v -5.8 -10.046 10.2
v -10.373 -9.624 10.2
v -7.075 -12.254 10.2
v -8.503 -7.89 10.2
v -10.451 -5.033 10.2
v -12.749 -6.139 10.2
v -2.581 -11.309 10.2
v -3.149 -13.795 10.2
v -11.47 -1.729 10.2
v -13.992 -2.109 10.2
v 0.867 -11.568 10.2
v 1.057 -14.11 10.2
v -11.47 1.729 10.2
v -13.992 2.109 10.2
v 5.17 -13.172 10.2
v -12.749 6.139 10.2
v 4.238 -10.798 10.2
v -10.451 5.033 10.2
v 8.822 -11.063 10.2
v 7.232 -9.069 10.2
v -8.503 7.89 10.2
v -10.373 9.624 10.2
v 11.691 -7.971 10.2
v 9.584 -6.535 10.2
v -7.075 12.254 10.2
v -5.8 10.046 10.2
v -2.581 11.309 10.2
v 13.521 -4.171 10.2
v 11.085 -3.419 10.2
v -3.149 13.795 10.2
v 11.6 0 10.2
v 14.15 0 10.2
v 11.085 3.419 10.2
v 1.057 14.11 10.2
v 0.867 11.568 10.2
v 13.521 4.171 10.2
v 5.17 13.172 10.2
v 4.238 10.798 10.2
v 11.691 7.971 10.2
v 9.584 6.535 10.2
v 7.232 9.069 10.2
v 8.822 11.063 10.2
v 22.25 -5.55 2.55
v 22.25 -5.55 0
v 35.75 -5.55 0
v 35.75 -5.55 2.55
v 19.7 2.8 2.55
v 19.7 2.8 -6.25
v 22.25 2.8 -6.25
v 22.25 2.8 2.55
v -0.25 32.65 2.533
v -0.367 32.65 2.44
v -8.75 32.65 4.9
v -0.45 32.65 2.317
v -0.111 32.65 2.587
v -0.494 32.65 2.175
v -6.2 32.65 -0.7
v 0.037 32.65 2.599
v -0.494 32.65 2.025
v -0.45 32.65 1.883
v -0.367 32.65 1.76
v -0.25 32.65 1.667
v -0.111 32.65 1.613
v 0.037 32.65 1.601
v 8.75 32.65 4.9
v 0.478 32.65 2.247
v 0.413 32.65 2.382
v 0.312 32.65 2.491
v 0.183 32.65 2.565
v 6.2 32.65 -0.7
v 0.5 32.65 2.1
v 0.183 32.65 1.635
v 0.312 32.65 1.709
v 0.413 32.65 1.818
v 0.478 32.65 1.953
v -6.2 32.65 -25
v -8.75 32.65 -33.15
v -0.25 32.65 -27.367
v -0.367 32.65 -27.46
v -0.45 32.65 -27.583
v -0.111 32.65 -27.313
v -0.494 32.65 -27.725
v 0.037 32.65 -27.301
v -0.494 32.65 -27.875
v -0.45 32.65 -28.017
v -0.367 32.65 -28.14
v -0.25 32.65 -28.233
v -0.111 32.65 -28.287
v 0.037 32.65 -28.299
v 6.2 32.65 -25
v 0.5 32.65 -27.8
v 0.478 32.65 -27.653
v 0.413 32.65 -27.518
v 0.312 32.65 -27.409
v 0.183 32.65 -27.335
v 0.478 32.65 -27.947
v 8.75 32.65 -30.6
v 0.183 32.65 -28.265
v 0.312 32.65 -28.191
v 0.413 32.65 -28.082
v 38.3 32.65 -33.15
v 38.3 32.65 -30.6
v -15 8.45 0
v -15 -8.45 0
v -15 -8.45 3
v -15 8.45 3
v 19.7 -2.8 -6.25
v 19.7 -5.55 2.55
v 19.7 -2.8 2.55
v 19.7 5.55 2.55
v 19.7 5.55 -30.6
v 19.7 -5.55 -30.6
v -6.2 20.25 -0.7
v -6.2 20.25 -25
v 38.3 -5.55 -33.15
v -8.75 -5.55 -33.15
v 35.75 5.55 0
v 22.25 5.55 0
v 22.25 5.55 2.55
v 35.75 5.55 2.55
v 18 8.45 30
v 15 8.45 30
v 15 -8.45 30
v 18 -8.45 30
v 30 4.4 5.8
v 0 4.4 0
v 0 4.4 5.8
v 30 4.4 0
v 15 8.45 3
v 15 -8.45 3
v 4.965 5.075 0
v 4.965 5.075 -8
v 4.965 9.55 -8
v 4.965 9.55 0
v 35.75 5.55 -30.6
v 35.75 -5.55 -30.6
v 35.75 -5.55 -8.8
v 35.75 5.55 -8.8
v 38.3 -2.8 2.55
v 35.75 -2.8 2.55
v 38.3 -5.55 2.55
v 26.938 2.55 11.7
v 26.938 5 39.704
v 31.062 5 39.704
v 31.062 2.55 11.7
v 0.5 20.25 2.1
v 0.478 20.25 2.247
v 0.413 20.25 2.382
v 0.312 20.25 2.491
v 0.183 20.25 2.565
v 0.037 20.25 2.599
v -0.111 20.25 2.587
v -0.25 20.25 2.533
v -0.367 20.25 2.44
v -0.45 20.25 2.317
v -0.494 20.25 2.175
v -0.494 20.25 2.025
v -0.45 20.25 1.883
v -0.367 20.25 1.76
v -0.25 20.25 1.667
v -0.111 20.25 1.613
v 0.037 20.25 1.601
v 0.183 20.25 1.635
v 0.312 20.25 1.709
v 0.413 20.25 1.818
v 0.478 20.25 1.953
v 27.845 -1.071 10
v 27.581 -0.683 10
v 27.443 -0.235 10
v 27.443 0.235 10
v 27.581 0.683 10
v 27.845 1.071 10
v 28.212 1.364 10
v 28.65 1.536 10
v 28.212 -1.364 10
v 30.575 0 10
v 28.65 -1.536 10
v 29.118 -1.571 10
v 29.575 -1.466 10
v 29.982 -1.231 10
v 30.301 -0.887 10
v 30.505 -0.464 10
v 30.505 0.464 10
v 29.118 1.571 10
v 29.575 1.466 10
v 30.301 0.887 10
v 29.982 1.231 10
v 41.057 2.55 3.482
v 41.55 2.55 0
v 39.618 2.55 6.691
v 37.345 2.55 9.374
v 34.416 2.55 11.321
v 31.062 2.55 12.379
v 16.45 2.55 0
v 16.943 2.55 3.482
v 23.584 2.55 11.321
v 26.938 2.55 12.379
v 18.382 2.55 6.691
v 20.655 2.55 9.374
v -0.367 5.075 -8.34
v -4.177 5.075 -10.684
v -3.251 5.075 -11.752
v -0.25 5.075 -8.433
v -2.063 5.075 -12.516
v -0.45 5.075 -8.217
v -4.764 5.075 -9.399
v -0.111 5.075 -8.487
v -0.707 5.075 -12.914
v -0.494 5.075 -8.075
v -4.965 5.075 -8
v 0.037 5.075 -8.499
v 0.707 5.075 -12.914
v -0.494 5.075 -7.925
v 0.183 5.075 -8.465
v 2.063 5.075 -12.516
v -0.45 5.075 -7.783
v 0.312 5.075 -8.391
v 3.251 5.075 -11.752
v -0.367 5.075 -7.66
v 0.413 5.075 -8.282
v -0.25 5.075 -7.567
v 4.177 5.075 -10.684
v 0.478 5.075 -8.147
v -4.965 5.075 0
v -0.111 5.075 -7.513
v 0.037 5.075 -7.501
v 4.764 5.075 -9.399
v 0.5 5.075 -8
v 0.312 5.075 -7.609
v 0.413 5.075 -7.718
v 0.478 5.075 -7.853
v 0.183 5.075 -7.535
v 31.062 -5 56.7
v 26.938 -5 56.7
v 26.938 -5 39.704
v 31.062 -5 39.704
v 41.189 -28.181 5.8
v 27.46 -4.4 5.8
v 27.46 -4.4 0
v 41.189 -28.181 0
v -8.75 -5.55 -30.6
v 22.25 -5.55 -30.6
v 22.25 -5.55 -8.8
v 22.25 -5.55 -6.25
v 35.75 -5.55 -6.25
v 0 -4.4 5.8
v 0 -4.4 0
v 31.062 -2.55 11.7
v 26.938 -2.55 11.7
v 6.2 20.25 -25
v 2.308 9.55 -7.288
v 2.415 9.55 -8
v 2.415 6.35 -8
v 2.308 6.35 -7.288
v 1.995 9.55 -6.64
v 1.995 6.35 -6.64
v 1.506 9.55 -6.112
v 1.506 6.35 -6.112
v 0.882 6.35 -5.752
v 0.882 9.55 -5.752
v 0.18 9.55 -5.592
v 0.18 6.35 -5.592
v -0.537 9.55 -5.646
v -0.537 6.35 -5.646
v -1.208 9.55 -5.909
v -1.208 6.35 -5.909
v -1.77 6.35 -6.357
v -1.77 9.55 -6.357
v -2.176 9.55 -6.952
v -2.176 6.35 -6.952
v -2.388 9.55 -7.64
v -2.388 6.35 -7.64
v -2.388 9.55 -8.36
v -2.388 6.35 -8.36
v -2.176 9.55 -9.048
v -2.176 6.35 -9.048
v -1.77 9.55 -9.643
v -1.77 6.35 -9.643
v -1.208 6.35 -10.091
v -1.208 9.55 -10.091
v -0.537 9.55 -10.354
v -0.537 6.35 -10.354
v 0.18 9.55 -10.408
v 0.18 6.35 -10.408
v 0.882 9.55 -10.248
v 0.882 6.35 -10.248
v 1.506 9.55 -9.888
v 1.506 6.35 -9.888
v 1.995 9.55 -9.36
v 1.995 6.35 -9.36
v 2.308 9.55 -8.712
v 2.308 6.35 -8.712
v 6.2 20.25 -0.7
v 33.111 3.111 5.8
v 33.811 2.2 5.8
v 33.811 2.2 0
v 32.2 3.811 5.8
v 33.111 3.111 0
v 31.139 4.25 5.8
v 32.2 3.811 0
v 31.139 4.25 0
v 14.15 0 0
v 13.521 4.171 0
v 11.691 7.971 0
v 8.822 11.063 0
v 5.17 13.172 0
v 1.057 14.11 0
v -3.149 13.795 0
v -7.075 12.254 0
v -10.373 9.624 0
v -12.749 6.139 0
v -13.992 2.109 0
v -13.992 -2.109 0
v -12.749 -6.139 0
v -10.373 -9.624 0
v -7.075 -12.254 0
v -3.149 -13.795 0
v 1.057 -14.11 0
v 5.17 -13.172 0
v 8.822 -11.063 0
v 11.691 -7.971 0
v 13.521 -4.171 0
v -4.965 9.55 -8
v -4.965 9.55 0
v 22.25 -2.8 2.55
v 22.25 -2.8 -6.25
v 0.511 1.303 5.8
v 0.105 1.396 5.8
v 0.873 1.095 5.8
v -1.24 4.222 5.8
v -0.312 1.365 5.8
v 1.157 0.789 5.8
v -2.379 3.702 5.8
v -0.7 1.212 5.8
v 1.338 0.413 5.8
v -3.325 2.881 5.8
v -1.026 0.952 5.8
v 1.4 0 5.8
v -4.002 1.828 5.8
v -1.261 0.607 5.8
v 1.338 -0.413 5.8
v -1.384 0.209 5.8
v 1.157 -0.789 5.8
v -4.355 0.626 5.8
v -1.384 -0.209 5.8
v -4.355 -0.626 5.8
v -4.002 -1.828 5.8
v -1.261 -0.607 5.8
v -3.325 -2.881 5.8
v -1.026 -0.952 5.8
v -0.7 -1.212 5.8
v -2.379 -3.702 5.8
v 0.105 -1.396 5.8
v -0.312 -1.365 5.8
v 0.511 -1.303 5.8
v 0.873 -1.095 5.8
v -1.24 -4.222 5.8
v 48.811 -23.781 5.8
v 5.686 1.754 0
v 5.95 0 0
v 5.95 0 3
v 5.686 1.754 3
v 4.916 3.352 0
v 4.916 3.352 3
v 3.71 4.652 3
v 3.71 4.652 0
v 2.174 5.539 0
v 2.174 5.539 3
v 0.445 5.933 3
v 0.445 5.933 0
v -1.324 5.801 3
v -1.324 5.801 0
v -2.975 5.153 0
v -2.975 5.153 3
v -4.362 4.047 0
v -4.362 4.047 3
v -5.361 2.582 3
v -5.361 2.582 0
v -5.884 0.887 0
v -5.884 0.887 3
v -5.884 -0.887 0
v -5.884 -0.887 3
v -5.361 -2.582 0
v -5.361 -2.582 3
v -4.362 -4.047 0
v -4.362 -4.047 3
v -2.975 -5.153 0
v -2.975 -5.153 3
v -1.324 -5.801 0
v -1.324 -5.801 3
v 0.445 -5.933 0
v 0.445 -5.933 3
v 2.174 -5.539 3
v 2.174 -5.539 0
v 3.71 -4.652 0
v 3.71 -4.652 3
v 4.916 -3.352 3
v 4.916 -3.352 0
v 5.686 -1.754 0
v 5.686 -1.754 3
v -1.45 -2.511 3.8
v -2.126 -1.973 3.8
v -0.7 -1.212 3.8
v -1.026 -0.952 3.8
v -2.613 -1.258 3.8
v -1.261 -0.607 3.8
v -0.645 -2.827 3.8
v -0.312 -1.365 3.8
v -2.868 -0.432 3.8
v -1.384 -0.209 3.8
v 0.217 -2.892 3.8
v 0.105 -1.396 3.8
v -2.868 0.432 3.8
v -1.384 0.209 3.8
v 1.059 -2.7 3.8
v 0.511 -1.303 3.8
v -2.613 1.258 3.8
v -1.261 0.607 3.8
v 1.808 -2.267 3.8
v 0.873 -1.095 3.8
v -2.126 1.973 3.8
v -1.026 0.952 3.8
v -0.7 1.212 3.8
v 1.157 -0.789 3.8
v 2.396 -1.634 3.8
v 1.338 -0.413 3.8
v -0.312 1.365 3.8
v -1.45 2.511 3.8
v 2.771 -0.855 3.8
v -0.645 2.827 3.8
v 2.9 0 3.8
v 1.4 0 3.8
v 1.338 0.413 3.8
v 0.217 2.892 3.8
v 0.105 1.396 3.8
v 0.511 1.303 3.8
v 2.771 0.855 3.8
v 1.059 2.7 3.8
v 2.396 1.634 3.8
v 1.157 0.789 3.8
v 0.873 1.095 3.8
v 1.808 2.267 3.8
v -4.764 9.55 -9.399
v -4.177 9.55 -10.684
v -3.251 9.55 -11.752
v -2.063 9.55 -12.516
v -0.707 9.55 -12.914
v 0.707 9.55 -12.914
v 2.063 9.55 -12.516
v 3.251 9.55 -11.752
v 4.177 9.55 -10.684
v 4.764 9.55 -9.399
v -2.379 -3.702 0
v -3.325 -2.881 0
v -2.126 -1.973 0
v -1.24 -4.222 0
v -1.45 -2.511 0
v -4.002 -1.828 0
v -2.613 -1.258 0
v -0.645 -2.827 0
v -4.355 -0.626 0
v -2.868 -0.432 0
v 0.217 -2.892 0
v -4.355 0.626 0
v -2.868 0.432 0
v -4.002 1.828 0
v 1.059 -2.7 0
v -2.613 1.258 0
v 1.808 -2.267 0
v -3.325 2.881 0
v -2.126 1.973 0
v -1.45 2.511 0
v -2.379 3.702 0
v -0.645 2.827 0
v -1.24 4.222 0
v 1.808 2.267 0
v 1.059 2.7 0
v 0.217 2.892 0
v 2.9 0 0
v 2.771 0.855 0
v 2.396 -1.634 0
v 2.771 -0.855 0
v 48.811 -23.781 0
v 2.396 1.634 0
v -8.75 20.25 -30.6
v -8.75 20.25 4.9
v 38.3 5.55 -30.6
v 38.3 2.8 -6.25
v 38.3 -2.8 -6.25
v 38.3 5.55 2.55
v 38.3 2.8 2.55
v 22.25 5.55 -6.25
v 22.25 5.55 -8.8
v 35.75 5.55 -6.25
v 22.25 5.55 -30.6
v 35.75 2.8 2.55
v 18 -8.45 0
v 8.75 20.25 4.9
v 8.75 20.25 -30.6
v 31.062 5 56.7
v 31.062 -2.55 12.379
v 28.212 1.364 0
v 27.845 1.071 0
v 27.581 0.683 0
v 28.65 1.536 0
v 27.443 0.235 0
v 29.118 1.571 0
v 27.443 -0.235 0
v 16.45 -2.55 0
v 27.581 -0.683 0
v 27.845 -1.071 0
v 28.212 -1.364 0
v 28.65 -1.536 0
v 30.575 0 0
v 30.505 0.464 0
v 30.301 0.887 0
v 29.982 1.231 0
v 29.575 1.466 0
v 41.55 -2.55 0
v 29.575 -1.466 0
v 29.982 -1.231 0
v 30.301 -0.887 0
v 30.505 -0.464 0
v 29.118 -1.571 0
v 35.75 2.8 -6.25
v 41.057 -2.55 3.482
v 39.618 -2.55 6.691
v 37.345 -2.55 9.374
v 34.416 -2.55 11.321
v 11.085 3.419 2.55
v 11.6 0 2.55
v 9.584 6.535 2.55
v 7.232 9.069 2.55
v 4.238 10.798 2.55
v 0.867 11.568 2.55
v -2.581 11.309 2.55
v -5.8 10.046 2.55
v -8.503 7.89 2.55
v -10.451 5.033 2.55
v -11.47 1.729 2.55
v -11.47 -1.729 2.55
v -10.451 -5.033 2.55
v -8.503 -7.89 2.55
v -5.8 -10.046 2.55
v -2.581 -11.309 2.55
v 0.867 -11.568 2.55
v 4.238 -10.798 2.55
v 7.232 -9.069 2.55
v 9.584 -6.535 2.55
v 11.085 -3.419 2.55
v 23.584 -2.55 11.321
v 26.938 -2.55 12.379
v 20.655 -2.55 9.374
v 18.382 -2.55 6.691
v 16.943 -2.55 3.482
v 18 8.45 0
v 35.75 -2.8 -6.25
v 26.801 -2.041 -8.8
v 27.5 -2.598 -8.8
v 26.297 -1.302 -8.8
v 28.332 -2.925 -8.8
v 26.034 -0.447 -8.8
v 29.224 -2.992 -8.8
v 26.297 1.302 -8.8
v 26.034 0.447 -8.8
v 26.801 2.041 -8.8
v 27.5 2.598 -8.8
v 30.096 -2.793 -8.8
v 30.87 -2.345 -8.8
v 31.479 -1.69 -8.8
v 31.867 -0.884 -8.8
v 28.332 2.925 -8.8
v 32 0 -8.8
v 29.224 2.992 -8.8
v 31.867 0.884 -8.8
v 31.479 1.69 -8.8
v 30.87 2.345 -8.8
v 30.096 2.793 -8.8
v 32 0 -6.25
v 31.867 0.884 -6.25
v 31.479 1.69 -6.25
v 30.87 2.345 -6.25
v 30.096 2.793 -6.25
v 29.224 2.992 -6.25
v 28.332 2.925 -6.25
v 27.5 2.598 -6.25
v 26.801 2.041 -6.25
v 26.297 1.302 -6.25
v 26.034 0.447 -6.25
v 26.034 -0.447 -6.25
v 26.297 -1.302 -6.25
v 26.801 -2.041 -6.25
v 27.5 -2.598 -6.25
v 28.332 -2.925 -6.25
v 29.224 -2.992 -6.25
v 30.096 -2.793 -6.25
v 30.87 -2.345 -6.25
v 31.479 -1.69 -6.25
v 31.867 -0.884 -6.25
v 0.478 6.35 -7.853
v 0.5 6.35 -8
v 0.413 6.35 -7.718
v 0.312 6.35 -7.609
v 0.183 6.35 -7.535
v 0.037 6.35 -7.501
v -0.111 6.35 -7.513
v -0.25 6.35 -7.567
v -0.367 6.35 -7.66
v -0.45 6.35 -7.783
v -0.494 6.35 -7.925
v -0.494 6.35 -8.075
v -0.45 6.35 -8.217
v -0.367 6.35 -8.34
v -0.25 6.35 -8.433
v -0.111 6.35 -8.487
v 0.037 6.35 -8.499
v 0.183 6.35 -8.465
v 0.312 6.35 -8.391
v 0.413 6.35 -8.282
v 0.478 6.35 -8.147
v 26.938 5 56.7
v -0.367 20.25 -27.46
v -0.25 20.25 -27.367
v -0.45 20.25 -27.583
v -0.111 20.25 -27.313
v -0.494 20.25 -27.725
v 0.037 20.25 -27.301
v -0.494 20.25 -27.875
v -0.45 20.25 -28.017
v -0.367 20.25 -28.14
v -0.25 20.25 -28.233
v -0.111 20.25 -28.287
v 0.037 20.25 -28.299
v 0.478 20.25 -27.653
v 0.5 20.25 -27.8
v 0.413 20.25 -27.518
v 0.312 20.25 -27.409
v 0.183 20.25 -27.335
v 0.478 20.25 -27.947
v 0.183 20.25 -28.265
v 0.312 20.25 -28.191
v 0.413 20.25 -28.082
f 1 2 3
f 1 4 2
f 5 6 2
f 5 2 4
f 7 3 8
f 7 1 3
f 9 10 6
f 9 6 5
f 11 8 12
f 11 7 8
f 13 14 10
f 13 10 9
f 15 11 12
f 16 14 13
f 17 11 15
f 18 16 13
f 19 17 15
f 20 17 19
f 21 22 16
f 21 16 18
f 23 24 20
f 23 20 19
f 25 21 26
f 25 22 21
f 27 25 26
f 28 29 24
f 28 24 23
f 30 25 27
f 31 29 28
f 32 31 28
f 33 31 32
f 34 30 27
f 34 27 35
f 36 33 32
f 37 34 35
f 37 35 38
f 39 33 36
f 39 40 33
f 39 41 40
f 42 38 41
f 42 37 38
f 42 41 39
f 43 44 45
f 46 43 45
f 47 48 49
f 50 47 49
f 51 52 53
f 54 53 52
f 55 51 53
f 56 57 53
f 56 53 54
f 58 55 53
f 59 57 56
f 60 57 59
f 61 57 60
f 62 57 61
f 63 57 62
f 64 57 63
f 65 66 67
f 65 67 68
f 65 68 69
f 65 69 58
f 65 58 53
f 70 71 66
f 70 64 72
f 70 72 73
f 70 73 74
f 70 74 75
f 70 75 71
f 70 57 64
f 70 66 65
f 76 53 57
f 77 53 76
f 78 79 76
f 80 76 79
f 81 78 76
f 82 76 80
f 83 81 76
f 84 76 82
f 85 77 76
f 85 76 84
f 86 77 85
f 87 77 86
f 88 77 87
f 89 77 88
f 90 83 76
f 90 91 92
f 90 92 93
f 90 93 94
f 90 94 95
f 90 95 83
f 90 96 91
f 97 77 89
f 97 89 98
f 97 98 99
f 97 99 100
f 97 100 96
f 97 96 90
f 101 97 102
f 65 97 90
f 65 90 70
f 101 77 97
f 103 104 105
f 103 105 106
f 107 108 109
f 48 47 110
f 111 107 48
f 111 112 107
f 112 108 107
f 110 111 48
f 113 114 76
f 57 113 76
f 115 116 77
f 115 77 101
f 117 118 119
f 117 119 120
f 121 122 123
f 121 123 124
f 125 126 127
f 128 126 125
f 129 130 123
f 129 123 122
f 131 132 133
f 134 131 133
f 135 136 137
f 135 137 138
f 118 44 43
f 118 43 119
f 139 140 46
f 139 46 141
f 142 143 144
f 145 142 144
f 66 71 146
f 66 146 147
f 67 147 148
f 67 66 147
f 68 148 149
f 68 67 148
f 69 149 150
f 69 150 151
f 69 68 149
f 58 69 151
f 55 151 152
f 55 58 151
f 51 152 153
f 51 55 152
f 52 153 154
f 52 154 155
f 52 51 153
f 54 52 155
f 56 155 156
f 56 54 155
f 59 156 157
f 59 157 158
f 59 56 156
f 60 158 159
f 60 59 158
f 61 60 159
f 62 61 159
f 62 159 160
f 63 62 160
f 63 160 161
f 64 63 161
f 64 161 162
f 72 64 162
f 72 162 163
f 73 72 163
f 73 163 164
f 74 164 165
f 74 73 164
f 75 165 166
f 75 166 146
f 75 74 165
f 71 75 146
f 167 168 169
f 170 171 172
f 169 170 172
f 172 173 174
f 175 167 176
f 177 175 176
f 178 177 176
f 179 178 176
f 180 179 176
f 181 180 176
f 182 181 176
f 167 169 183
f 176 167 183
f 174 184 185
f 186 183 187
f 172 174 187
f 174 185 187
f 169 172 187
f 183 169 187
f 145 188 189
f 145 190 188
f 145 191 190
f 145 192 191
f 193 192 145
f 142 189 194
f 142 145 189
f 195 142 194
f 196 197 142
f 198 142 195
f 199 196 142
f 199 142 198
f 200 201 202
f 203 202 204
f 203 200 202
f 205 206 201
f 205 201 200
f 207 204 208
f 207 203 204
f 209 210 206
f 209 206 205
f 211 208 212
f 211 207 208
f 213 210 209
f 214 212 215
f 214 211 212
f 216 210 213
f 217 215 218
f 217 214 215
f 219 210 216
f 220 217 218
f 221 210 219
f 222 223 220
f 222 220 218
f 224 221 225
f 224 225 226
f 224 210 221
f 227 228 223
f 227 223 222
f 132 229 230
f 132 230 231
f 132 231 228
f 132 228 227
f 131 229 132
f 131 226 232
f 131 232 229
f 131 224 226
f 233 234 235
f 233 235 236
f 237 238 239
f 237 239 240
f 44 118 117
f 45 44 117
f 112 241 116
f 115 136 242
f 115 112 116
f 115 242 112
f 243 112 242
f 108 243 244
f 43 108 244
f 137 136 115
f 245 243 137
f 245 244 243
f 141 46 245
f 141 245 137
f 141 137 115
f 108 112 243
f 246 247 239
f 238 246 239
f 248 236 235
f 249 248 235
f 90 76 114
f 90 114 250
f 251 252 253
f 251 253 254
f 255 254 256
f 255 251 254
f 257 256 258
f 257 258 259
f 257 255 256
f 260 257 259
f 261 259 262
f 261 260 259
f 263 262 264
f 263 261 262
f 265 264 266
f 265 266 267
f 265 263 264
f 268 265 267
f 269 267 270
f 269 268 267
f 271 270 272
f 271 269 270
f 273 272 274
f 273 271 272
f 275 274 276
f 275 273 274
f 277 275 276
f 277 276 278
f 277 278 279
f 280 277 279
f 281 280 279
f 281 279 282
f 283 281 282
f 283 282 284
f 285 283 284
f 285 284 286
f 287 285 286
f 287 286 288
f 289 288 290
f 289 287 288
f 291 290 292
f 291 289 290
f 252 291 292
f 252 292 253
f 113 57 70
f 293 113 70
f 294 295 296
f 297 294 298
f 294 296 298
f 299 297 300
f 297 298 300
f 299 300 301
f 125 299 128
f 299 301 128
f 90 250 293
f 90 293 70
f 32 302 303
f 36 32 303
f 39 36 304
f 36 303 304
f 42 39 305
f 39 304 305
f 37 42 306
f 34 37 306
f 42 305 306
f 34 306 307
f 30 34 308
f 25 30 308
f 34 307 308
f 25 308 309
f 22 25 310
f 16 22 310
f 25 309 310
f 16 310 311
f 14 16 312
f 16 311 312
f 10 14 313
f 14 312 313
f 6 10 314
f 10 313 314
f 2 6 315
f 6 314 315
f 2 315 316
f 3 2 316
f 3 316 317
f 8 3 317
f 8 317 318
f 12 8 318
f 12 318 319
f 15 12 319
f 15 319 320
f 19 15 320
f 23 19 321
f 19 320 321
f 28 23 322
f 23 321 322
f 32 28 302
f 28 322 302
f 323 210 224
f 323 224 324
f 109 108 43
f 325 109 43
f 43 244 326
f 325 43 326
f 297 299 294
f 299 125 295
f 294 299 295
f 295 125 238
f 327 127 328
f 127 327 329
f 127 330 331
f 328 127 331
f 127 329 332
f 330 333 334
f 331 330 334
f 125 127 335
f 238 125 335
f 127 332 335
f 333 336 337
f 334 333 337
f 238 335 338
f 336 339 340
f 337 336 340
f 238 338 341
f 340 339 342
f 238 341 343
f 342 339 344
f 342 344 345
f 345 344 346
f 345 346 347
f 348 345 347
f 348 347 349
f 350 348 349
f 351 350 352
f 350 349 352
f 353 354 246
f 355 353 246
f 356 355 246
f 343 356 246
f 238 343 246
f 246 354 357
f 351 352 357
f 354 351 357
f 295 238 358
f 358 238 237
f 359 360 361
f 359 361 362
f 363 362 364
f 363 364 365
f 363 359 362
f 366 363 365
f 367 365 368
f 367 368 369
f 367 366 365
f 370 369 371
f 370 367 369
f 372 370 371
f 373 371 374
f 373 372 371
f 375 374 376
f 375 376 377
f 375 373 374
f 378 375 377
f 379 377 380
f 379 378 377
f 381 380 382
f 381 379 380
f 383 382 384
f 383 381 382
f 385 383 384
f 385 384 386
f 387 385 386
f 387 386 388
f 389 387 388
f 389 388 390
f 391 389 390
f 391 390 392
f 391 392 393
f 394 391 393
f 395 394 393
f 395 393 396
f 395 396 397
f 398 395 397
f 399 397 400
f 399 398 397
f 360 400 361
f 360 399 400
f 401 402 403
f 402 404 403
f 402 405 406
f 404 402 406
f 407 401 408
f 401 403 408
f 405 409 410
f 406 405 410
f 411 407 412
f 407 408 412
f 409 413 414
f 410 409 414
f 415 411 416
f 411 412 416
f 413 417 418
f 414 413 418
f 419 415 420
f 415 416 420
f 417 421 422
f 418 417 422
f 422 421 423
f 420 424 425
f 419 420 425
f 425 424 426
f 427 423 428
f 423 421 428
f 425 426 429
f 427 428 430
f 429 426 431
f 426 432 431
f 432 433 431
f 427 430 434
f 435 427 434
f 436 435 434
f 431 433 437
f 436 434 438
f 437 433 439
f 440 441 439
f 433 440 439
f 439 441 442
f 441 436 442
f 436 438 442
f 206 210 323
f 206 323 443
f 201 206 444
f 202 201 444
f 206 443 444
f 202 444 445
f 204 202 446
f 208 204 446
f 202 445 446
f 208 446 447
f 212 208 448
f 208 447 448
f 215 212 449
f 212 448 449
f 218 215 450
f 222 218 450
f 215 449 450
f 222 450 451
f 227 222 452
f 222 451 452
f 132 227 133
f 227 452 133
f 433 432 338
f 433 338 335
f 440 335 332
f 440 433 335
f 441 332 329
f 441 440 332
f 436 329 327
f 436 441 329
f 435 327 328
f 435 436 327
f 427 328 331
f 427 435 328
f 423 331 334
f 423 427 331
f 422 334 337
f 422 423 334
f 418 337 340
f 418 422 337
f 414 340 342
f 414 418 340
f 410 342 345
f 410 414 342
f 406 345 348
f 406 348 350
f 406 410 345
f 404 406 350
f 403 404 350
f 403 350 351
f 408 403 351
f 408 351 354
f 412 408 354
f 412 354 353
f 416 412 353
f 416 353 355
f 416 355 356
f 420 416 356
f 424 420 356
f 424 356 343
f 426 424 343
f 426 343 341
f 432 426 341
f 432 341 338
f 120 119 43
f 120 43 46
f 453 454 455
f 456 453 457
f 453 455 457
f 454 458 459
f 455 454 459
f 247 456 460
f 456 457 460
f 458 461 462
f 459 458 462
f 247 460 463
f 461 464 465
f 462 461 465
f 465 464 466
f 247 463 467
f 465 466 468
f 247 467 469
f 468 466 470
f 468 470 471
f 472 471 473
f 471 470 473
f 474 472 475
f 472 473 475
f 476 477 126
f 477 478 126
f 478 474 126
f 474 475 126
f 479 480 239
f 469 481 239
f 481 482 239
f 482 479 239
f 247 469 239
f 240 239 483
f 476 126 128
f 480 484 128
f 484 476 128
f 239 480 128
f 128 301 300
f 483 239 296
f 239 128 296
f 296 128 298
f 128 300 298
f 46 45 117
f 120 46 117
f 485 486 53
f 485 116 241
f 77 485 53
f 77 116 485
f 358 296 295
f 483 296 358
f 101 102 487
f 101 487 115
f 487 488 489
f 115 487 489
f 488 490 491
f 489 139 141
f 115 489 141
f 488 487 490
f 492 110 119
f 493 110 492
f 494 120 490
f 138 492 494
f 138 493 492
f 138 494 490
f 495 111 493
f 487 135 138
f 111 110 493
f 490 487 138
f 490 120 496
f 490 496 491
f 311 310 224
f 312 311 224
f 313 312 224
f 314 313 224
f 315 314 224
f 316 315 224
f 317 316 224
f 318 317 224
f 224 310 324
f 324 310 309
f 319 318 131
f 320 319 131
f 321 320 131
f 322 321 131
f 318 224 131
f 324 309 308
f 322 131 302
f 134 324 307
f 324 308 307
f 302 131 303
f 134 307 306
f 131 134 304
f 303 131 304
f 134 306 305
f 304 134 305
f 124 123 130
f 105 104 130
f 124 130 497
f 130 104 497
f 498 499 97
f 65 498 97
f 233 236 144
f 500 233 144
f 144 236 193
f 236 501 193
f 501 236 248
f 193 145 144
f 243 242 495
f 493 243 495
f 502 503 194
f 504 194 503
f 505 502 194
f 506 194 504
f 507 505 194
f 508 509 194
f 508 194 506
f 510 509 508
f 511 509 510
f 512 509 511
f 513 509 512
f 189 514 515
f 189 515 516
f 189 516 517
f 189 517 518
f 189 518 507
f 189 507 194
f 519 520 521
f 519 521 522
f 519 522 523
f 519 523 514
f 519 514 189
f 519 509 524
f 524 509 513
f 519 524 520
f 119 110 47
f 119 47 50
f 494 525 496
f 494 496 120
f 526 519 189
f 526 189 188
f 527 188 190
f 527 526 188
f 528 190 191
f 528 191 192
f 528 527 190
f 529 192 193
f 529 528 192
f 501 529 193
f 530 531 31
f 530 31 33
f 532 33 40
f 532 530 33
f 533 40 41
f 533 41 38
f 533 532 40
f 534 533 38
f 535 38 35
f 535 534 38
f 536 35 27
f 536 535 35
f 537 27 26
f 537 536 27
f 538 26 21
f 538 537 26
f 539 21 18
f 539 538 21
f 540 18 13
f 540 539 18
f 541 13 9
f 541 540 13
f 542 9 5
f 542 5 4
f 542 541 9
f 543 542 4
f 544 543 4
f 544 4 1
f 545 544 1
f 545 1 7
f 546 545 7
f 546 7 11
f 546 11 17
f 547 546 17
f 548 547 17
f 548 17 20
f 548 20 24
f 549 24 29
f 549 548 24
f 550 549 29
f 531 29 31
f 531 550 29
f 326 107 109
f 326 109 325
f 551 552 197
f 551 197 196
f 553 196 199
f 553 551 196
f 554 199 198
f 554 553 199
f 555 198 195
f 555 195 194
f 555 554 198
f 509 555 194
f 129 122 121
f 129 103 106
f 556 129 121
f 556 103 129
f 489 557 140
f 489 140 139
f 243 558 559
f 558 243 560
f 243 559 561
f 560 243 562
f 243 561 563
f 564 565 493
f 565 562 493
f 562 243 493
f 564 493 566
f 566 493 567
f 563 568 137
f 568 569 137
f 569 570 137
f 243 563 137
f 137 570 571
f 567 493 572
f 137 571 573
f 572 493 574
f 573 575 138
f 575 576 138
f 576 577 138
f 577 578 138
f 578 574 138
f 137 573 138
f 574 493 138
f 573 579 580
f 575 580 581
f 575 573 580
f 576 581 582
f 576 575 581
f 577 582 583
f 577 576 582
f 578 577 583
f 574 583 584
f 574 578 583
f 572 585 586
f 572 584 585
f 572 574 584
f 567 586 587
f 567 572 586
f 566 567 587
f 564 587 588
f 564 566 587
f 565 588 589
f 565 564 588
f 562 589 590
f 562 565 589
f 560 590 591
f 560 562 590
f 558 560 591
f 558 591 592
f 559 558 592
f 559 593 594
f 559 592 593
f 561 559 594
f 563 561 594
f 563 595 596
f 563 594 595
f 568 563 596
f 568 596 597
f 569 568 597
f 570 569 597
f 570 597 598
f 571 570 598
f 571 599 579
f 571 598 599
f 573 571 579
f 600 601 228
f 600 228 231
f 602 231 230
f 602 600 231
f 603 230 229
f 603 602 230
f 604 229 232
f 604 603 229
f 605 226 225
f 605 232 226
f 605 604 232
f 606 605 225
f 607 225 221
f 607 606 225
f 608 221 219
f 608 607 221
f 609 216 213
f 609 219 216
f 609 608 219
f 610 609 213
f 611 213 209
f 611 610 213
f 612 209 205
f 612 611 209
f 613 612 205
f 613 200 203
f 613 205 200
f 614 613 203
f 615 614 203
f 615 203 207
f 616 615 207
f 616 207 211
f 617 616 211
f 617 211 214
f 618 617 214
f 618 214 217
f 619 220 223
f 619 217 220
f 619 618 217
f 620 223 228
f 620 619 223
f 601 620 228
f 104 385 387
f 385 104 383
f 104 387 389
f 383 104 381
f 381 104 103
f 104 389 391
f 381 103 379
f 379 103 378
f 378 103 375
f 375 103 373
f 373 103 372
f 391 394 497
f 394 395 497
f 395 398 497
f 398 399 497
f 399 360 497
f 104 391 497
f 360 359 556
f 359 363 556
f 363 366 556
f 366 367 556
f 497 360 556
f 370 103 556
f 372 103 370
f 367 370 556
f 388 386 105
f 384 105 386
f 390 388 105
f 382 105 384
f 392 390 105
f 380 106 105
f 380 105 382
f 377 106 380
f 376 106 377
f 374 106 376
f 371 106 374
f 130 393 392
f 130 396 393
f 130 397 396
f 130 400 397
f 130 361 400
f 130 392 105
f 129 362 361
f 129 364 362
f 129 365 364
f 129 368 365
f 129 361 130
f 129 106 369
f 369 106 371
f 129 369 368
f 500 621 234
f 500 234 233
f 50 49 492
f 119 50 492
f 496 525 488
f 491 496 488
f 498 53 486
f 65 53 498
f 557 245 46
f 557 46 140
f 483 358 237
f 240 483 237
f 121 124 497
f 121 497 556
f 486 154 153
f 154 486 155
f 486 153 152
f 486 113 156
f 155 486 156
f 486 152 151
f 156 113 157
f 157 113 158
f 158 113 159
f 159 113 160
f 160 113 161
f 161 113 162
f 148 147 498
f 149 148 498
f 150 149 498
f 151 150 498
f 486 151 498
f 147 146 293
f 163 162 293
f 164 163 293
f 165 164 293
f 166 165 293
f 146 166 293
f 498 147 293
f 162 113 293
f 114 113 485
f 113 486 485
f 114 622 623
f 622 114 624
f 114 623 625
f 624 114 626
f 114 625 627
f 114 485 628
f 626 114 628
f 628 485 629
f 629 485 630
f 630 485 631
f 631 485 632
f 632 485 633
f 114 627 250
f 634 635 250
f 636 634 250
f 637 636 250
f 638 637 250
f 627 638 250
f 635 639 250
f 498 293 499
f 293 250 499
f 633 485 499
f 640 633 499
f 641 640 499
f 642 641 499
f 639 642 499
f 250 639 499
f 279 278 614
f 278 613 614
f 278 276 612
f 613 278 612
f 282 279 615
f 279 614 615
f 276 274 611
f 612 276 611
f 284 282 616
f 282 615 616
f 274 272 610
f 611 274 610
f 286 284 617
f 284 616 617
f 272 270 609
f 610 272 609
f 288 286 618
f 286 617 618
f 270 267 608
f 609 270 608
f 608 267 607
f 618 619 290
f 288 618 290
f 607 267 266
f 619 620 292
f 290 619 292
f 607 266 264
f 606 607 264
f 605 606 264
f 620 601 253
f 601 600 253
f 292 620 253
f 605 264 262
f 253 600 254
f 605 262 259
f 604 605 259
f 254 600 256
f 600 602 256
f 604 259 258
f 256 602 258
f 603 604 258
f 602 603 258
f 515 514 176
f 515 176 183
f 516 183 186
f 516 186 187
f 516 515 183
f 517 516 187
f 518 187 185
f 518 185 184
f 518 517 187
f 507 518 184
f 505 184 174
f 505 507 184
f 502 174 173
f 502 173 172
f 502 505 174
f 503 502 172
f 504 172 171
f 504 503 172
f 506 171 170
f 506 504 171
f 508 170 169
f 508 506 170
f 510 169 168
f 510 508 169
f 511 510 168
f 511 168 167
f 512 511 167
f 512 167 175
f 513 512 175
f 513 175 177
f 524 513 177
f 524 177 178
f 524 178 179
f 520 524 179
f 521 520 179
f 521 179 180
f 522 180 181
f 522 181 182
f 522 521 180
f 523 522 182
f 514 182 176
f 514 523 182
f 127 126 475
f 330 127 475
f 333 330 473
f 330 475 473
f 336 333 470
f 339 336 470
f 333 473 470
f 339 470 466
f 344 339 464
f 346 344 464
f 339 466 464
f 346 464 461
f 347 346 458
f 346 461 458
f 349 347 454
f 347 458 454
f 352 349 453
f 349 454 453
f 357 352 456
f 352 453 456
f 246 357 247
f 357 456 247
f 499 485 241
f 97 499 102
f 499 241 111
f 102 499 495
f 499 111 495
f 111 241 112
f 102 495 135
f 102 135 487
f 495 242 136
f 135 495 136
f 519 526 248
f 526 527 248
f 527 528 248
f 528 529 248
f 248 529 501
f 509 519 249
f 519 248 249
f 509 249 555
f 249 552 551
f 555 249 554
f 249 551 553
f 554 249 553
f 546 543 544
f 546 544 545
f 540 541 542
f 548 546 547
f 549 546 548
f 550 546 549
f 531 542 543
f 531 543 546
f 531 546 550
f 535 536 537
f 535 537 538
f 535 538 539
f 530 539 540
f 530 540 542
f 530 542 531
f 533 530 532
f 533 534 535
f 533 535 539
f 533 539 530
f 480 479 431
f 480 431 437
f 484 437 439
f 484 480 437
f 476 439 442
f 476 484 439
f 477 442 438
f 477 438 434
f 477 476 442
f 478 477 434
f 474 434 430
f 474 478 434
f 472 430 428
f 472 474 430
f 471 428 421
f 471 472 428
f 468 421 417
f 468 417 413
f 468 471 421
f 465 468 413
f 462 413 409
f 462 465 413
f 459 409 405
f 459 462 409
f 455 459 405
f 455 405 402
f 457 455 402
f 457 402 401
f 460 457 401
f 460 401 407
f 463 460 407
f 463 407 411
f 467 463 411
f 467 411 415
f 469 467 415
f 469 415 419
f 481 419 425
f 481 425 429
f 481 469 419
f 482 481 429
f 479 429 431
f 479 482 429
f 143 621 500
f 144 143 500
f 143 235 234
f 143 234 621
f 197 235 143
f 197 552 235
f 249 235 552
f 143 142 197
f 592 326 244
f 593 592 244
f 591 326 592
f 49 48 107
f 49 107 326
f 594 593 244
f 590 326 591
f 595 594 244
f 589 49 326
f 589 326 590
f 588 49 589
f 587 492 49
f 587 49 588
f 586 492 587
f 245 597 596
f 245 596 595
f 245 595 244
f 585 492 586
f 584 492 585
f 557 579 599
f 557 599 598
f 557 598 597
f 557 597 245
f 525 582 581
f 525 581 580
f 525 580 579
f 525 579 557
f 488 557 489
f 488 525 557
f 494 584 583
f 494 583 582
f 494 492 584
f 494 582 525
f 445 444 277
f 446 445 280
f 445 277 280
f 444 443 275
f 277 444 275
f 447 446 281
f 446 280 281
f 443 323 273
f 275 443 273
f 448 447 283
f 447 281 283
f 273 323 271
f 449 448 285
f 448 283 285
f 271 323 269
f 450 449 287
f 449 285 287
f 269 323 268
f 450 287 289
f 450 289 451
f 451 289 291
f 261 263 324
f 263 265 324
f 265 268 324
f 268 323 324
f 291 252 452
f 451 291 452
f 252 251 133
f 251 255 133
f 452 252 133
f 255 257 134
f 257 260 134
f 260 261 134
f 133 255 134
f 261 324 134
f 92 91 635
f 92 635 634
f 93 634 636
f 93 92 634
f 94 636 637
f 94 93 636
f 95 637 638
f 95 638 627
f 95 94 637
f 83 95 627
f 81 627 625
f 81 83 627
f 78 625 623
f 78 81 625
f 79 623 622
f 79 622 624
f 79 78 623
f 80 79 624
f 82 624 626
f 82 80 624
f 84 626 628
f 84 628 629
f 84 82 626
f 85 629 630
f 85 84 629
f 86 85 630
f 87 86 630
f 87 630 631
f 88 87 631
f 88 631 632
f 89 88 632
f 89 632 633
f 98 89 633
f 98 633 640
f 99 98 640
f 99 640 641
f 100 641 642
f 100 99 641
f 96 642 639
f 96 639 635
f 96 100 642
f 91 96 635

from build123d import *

# Parameters (mm, degrees)
CYLINDER_R                = 1.575
CYLINDER_DEPTH            = 10
CYLINDER001_W             = 12.55
CYLINDER001_H             = 5.1
CYLINDER001_ANGLE         = 180
BOX002_W                  = 4.125
BOX002_H                  = 10
BOX002_DEPTH              = 45
BOX002_ROLL_ANGLE         = -5.000003
BOX002_PLACEMENT_ANGLE    = 180
BOX001_W                  = 4.125
BOX001_H                  = 10
BOX001_DEPTH              = 45
BOX001_PLACEMENT_ANGLE    = 5
BOX_W                     = 4.125
BOX_H                     = 10
BOX_DEPTH                 = 45
CYLINDER006_R             = 0.5
CYLINDER006_DEPTH         = 8.95
CYLINDER004_R             = 2.415
CYLINDER004_DEPTH         = 3.2
CYLINDER002_R             = 11.6
CYLINDER002_DEPTH         = 7.65
BOX003_W                  = 9.93
BOX003_H                  = 4.475
BOX003_DEPTH              = 8
CYLINDER005_R             = 4.965
CYLINDER005_DEPTH         = 4.475
CYLINDER003_R             = 14.15
CYLINDER003_DEPTH         = 10.2
BOX012_W                  = 13.5
BOX012_H                  = 11.1
BOX012_DEPTH              = 2.55
CYLINDER007_R             = 0.5
CYLINDER007_DEPTH         = 12.4
CYLINDER008_R             = 0.5
CYLINDER008_DEPTH         = 12.4
CYLINDER009_R             = 3
CYLINDER009_DEPTH         = 7.65
BOX013_W                  = 18.6
BOX013_H                  = 5.6
BOX013_DEPTH              = 11.35
BOX010_W                  = 2.55
BOX010_H                  = 11.1
BOX010_DEPTH              = 33.15
BOX008_W                  = 13.5
BOX008_H                  = 11.1
BOX008_DEPTH              = 2.55
BOX009_W                  = 47.05
BOX009_H                  = 38.2
BOX009_DEPTH              = 2.55
BOX007_W                  = 12.4
BOX007_H                  = 12.4
BOX007_DEPTH              = 5.6
BOX006_W                  = 2.55
BOX006_H                  = 12.4
BOX006_DEPTH              = 35.5
BOX005_W                  = 2.55
BOX005_H                  = 12.4
BOX005_DEPTH              = 35.5
BOX004_W                  = 12.4
BOX004_H                  = 12.4
BOX004_DEPTH              = 5.6
BOX011_W                  = 2.55
BOX011_H                  = 11.1
BOX011_DEPTH              = 33.15
CYLINDER013_R             = 5.95
CYLINDER013_DEPTH         = 3
BOX016_W                  = 3
BOX016_H                  = 16.9
BOX016_DEPTH              = 30
BOX015_W                  = 30
BOX015_H                  = 16.9
BOX015_DEPTH              = 3
CYLINDER014_R             = 4.4
CYLINDER014_DEPTH         = 5.8
BOX018_W                  = 30
BOX018_H                  = 4.4
BOX018_DEPTH              = 5.8
BOX017_W                  = 30
BOX017_H                  = 4.4
BOX017_DEPTH              = 5.8
FUSION005_PLACEMENT_ANGLE = 300
CYLINDER010_R             = 2.9
CYLINDER010_DEPTH         = 3.8
CYLINDER012_R             = 1.4
CYLINDER012_DEPTH         = 5.8
CYLINDER011_R             = 4.4
CYLINDER011_DEPTH         = 5.8
BOX014_W                  = 30
BOX014_H                  = 8.8
BOX014_DEPTH              = 5.8


with BuildPart() as palancahueco:
    # Cylinder → Cylinder (new body)
    with BuildSketch(Plane.XY):
        Circle(CYLINDER_R)
    extrude(amount=CYLINDER_DEPTH)


with BuildPart() as palancacarril:
    # Cylinder001 → Cylinder001 (revolve)
    with BuildSketch(Plane(origin=(0, 2.55, 0), x_dir=(1, 0, 0), z_dir=(0, 0, -1))):
        with Locations((6.275, 2.55)):
            Rectangle(CYLINDER001_W, CYLINDER001_H)
    revolve(axis=Axis((0, 2.55, 0), (0, -1, 0)), revolution_arc=CYLINDER001_ANGLE)


with BuildPart() as palancapalaquita001:
    # Box002 → Box002 (new body)
    with BuildSketch(Plane.XY):
        with Locations((2.0625, 5)):
            Rectangle(BOX002_W, BOX002_H)
    extrude(amount=BOX002_DEPTH)


with BuildPart() as palancapalaquita001_1:
    # Box002 roll: moved
    add(palancapalaquita001.part.rotate(Axis((0, 0, 0), (1, 0, 0)), BOX002_ROLL_ANGLE))


with BuildPart() as palancapalaquita001_2:
    # Box002 placement: moved
    add(palancapalaquita001_1.part.moved(Location((2.0625, -2.55, 11.7))).rotate(Axis((2.0625, -2.55, 11.7), (0, 0, 1)), BOX002_PLACEMENT_ANGLE))


with BuildPart() as palancapalaquita:
    # Box001 → Box001 (new body)
    with BuildSketch(Plane.XY):
        with Locations((2.0625, 5)):
            Rectangle(BOX001_W, BOX001_H)
    extrude(amount=BOX001_DEPTH)


with BuildPart() as palancapalaquita_1:
    # Box001 placement: moved
    add(palancapalaquita.part.moved(Location((-2.0625, 2.55, 11.7))).rotate(Axis((-2.0625, 2.55, 11.7), (-1, 0, 0)), BOX001_PLACEMENT_ANGLE))


with BuildPart() as palanca:
    # Box → Box (new body)
    with BuildSketch(Plane(origin=(-2.0625, -5, 11.7), x_dir=(1, 0, 0), z_dir=(0, 0, 1))):
        with Locations((2.0625, 5)):
            Rectangle(BOX_W, BOX_H)
    extrude(amount=BOX_DEPTH)

    # Cut: cut PalancaPalaQuita
    add(palancapalaquita_1.part, mode=Mode.SUBTRACT)

    # Cut001: cut PalancaPalaQuita001
    add(palancapalaquita001_2.part, mode=Mode.SUBTRACT)

    # Fusion: union PalancaCarril
    add(palancacarril.part)

    # Cut002: cut PalancaHueco
    add(palancahueco.part, mode=Mode.SUBTRACT)


with BuildPart() as palanca_1:
    # Cut002 placement: moved
    add(palanca.part.moved(Location((29, 0, 0))))


with BuildPart() as taladrotornilloanillomotor:
    # Cylinder006 → Cylinder006 (new body)
    with BuildSketch(Plane(origin=(0, 9.55, -8), x_dir=(1, 0, 0), z_dir=(0, -1, 0))):
        Circle(CYLINDER006_R)
    extrude(amount=CYLINDER006_DEPTH)


with BuildPart() as motorinterior:
    # Cylinder004 → Cylinder004 (new body)
    with BuildSketch(Plane(origin=(0, 9.55, -8), x_dir=(1, 0, 0), z_dir=(0, -1, 0))):
        Circle(CYLINDER004_R)
    extrude(amount=CYLINDER004_DEPTH)


with BuildPart() as anillointerior:
    # Cylinder002 → Cylinder002 (new body)
    with BuildSketch(Plane.XY.offset(2.55)):
        Circle(CYLINDER002_R)
    extrude(amount=CYLINDER002_DEPTH)


with BuildPart() as radio:
    # Box003 → Box003 (new body)
    with BuildSketch(Plane(origin=(-4.965, 5.075, -8), x_dir=(1, 0, 0), z_dir=(0, 0, 1))):
        with Locations((4.965, 2.2375)):
            Rectangle(BOX003_W, BOX003_H)
    extrude(amount=BOX003_DEPTH)


with BuildPart() as motorexterior:
    # Cylinder005 → Cylinder005 (new body)
    with BuildSketch(Plane(origin=(0, 9.55, -8), x_dir=(1, 0, 0), z_dir=(0, -1, 0))):
        Circle(CYLINDER005_R)
    extrude(amount=CYLINDER005_DEPTH)


with BuildPart() as soportededo:
    # Cylinder003 → Cylinder003 (new body)
    with BuildSketch(Plane.XY):
        Circle(CYLINDER003_R)
    extrude(amount=CYLINDER003_DEPTH)

    # Fusion001: union Radio, MotorExterior
    add(radio.part)
    add(motorexterior.part)

    # Cut003: cut AnilloInterior
    add(anillointerior.part, mode=Mode.SUBTRACT)

    # Cut004: cut MotorInterior
    add(motorinterior.part, mode=Mode.SUBTRACT)

    # Cut005: cut TaladroTornilloAnilloMotor
    add(taladrotornilloanillomotor.part, mode=Mode.SUBTRACT)


with BuildPart() as baseswitch001:
    # Box012 → Box012 (new body)
    with BuildSketch(Plane(origin=(22.25, -5.55, 0), x_dir=(1, 0, 0), z_dir=(0, 0, 1))):
        with Locations((6.75, 5.55)):
            Rectangle(BOX012_W, BOX012_H)
    extrude(amount=BOX012_DEPTH)


with BuildPart() as taladroanclajeservo:
    # Cylinder007 → Cylinder007 (new body)
    with BuildSketch(Plane(origin=(0, 32.65, -27.8), x_dir=(1, 0, 0), z_dir=(0, -1, 0))):
        Circle(CYLINDER007_R)
    extrude(amount=CYLINDER007_DEPTH)


with BuildPart() as taladroanclajeservo001:
    # Cylinder008 → Cylinder008 (new body)
    with BuildSketch(Plane(origin=(0, 32.65, 2.1), x_dir=(1, 0, 0), z_dir=(0, -1, 0))):
        Circle(CYLINDER008_R)
    extrude(amount=CYLINDER008_DEPTH)


with BuildPart() as taladroswitch:
    # Cylinder009 → Cylinder009 (new body)
    with BuildSketch(Plane(origin=(29, 0, -8.8), x_dir=(1, 0, 0), z_dir=(0, 0, 1))):
        Circle(CYLINDER009_R)
    extrude(amount=CYLINDER009_DEPTH)


with BuildPart() as quitacarril:
    # Box013 → Box013 (new body)
    with BuildSketch(Plane(origin=(19.7, -2.8, -6.25), x_dir=(1, 0, 0), z_dir=(0, 0, 1))):
        with Locations((9.3, 2.8)):
            Rectangle(BOX013_W, BOX013_H)
    extrude(amount=BOX013_DEPTH)


with BuildPart() as ladocajaswitch:
    # Box010 → Box010 (new body)
    with BuildSketch(Plane(origin=(19.7, -5.55, -30.6), x_dir=(1, 0, 0), z_dir=(0, 0, 1))):
        with Locations((1.275, 5.55)):
            Rectangle(BOX010_W, BOX010_H)
    extrude(amount=BOX010_DEPTH)


with BuildPart() as baseswitch:
    # Box008 → Box008 (new body)
    with BuildSketch(Plane(origin=(22.25, -5.55, -8.8), x_dir=(1, 0, 0), z_dir=(0, 0, 1))):
        with Locations((6.75, 5.55)):
            Rectangle(BOX008_W, BOX008_H)
    extrude(amount=BOX008_DEPTH)


with BuildPart() as suelo:
    # Box009 → Box009 (new body)
    with BuildSketch(Plane(origin=(-8.75, 32.65, -30.6), x_dir=(1, 0, 0), z_dir=(0, 0, -1))):
        with Locations((23.525, 19.1)):
            Rectangle(BOX009_W, BOX009_H)
    extrude(amount=BOX009_DEPTH)


with BuildPart() as topservo:
    # Box007 → Box007 (new body)
    with BuildSketch(Plane(origin=(-6.2, 20.25, -0.7), x_dir=(1, 0, 0), z_dir=(0, 0, 1))):
        with Locations((6.2, 6.2)):
            Rectangle(BOX007_W, BOX007_H)
    extrude(amount=BOX007_DEPTH)


with BuildPart() as ladocajaservo001:
    # Box006 → Box006 (new body)
    with BuildSketch(Plane(origin=(6.2, 20.25, -30.6), x_dir=(1, 0, 0), z_dir=(0, 0, 1))):
        with Locations((1.275, 6.2)):
            Rectangle(BOX006_W, BOX006_H)
    extrude(amount=BOX006_DEPTH)


with BuildPart() as ladocajaservo:
    # Box005 → Box005 (new body)
    with BuildSketch(Plane(origin=(-8.75, 20.25, -30.6), x_dir=(1, 0, 0), z_dir=(0, 0, 1))):
        with Locations((1.275, 6.2)):
            Rectangle(BOX005_W, BOX005_H)
    extrude(amount=BOX005_DEPTH)


with BuildPart() as baseservo:
    # Box004 → Box004 (new body)
    with BuildSketch(Plane(origin=(-6.2, 20.25, -30.6), x_dir=(1, 0, 0), z_dir=(0, 0, 1))):
        with Locations((6.2, 6.2)):
            Rectangle(BOX004_W, BOX004_H)
    extrude(amount=BOX004_DEPTH)


with BuildPart() as soporteconjunto:
    # Box011 → Box011 (new body)
    with BuildSketch(Plane(origin=(35.75, -5.55, -30.6), x_dir=(1, 0, 0), z_dir=(0, 0, 1))):
        with Locations((1.275, 5.55)):
            Rectangle(BOX011_W, BOX011_H)
    extrude(amount=BOX011_DEPTH)

    # Fusion002: union LadoCajaSwitch, BaseSwitch, Suelo, TopServo, LadoCajaServo001, LadoCajaServo, BaseServo
    add(ladocajaswitch.part)
    add(baseswitch.part)
    add(suelo.part)
    add(topservo.part)
    add(ladocajaservo001.part)
    add(ladocajaservo.part)
    add(baseservo.part)

    # Cut006: cut QuitaCarril
    add(quitacarril.part, mode=Mode.SUBTRACT)

    # Cut007: cut TaladroSwitch
    add(taladroswitch.part, mode=Mode.SUBTRACT)

    # Cut008: cut TaladroAnclajeServo001
    add(taladroanclajeservo001.part, mode=Mode.SUBTRACT)

    # Cut009: cut TaladroAnclajeServo
    add(taladroanclajeservo.part, mode=Mode.SUBTRACT)


with BuildPart() as taladroswitchgordo:
    # Cylinder013 → Cylinder013 (new body)
    with BuildSketch(Plane.XY):
        Circle(CYLINDER013_R)
    extrude(amount=CYLINDER013_DEPTH)


with BuildPart() as basefrenteswitchgordo:
    # Box016 → Box016 (new body)
    with BuildSketch(Plane(origin=(15, -8.45, 0), x_dir=(1, 0, 0), z_dir=(0, 0, 1))):
        with Locations((1.5, 8.45)):
            Rectangle(BOX016_W, BOX016_H)
    extrude(amount=BOX016_DEPTH)


with BuildPart() as l_switchgordo:
    # Box015 → Box015 (new body)
    with BuildSketch(Plane(origin=(-15, -8.45, 0), x_dir=(1, 0, 0), z_dir=(0, 0, 1))):
        with Locations((15, 8.45)):
            Rectangle(BOX015_W, BOX015_H)
    extrude(amount=BOX015_DEPTH)

    # Fusion004: union BaseFrenteSwitchGordo
    add(basefrenteswitchgordo.part)

    # Cut012: cut TaladroSwitchGordo
    add(taladroswitchgordo.part, mode=Mode.SUBTRACT)


with BuildPart() as rotula:
    # Cylinder014 → Cylinder014 (new body)
    with BuildSketch(Plane(origin=(30, 0, 0), x_dir=(1, 0, 0), z_dir=(0, 0, 1))):
        Circle(CYLINDER014_R)
    extrude(amount=CYLINDER014_DEPTH)


with BuildPart() as medioradioflotante001:
    # Box018 → Box018 (new body)
    with BuildSketch(Plane(origin=(0, 0, 5.8), x_dir=(1, 0, 0), z_dir=(0, 0, -1))):
        with Locations((15, 2.2)):
            Rectangle(BOX018_W, BOX018_H)
    extrude(amount=BOX018_DEPTH)


with BuildPart() as radioflotante:
    # Box017 → Box017 (new body)
    with BuildSketch(Plane.XY):
        with Locations((15, 2.2)):
            Rectangle(BOX017_W, BOX017_H)
    extrude(amount=BOX017_DEPTH)

    # Fusion005: union MedioRadioFlotante001
    add(medioradioflotante001.part)


with BuildPart() as radioflotante_1:
    # Fusion005 placement: moved
    add(radioflotante.part.moved(Location((30, 0, 0))).rotate(Axis((30, 0, 0), (0, 0, 1)), FUSION005_PLACEMENT_ANGLE))


with BuildPart() as interiorservogrande:
    # Cylinder010 → Cylinder010 (new body)
    with BuildSketch(Plane.XY):
        Circle(CYLINDER010_R)
    extrude(amount=CYLINDER010_DEPTH)


with BuildPart() as taladroservogrande:
    # Cylinder012 → Cylinder012 (new body)
    with BuildSketch(Plane.XY):
        Circle(CYLINDER012_R)
    extrude(amount=CYLINDER012_DEPTH)


with BuildPart() as exteriorservogrande:
    # Cylinder011 → Cylinder011 (new body)
    with BuildSketch(Plane.XY):
        Circle(CYLINDER011_R)
    extrude(amount=CYLINDER011_DEPTH)


with BuildPart() as radiocurvo:
    # Box014 → Box014 (new body)
    with BuildSketch(Plane(origin=(0, -4.4, 0), x_dir=(1, 0, 0), z_dir=(0, 0, 1))):
        with Locations((15, 4.4)):
            Rectangle(BOX014_W, BOX014_H)
    extrude(amount=BOX014_DEPTH)

    # Fusion003: union ExteriorServoGrande
    add(exteriorservogrande.part)

    # Cut010: cut TaladroServoGrande
    add(taladroservogrande.part, mode=Mode.SUBTRACT)

    # Cut011: cut InteriorServoGrande
    add(interiorservogrande.part, mode=Mode.SUBTRACT)

    # Fusion006: union Rotula, RadioFlotante
    add(rotula.part)
    add(radioflotante_1.part)


solid = Compound([palanca_1.part, soportededo.part, baseswitch001.part, soporteconjunto.part, l_switchgordo.part, radiocurvo.part])
